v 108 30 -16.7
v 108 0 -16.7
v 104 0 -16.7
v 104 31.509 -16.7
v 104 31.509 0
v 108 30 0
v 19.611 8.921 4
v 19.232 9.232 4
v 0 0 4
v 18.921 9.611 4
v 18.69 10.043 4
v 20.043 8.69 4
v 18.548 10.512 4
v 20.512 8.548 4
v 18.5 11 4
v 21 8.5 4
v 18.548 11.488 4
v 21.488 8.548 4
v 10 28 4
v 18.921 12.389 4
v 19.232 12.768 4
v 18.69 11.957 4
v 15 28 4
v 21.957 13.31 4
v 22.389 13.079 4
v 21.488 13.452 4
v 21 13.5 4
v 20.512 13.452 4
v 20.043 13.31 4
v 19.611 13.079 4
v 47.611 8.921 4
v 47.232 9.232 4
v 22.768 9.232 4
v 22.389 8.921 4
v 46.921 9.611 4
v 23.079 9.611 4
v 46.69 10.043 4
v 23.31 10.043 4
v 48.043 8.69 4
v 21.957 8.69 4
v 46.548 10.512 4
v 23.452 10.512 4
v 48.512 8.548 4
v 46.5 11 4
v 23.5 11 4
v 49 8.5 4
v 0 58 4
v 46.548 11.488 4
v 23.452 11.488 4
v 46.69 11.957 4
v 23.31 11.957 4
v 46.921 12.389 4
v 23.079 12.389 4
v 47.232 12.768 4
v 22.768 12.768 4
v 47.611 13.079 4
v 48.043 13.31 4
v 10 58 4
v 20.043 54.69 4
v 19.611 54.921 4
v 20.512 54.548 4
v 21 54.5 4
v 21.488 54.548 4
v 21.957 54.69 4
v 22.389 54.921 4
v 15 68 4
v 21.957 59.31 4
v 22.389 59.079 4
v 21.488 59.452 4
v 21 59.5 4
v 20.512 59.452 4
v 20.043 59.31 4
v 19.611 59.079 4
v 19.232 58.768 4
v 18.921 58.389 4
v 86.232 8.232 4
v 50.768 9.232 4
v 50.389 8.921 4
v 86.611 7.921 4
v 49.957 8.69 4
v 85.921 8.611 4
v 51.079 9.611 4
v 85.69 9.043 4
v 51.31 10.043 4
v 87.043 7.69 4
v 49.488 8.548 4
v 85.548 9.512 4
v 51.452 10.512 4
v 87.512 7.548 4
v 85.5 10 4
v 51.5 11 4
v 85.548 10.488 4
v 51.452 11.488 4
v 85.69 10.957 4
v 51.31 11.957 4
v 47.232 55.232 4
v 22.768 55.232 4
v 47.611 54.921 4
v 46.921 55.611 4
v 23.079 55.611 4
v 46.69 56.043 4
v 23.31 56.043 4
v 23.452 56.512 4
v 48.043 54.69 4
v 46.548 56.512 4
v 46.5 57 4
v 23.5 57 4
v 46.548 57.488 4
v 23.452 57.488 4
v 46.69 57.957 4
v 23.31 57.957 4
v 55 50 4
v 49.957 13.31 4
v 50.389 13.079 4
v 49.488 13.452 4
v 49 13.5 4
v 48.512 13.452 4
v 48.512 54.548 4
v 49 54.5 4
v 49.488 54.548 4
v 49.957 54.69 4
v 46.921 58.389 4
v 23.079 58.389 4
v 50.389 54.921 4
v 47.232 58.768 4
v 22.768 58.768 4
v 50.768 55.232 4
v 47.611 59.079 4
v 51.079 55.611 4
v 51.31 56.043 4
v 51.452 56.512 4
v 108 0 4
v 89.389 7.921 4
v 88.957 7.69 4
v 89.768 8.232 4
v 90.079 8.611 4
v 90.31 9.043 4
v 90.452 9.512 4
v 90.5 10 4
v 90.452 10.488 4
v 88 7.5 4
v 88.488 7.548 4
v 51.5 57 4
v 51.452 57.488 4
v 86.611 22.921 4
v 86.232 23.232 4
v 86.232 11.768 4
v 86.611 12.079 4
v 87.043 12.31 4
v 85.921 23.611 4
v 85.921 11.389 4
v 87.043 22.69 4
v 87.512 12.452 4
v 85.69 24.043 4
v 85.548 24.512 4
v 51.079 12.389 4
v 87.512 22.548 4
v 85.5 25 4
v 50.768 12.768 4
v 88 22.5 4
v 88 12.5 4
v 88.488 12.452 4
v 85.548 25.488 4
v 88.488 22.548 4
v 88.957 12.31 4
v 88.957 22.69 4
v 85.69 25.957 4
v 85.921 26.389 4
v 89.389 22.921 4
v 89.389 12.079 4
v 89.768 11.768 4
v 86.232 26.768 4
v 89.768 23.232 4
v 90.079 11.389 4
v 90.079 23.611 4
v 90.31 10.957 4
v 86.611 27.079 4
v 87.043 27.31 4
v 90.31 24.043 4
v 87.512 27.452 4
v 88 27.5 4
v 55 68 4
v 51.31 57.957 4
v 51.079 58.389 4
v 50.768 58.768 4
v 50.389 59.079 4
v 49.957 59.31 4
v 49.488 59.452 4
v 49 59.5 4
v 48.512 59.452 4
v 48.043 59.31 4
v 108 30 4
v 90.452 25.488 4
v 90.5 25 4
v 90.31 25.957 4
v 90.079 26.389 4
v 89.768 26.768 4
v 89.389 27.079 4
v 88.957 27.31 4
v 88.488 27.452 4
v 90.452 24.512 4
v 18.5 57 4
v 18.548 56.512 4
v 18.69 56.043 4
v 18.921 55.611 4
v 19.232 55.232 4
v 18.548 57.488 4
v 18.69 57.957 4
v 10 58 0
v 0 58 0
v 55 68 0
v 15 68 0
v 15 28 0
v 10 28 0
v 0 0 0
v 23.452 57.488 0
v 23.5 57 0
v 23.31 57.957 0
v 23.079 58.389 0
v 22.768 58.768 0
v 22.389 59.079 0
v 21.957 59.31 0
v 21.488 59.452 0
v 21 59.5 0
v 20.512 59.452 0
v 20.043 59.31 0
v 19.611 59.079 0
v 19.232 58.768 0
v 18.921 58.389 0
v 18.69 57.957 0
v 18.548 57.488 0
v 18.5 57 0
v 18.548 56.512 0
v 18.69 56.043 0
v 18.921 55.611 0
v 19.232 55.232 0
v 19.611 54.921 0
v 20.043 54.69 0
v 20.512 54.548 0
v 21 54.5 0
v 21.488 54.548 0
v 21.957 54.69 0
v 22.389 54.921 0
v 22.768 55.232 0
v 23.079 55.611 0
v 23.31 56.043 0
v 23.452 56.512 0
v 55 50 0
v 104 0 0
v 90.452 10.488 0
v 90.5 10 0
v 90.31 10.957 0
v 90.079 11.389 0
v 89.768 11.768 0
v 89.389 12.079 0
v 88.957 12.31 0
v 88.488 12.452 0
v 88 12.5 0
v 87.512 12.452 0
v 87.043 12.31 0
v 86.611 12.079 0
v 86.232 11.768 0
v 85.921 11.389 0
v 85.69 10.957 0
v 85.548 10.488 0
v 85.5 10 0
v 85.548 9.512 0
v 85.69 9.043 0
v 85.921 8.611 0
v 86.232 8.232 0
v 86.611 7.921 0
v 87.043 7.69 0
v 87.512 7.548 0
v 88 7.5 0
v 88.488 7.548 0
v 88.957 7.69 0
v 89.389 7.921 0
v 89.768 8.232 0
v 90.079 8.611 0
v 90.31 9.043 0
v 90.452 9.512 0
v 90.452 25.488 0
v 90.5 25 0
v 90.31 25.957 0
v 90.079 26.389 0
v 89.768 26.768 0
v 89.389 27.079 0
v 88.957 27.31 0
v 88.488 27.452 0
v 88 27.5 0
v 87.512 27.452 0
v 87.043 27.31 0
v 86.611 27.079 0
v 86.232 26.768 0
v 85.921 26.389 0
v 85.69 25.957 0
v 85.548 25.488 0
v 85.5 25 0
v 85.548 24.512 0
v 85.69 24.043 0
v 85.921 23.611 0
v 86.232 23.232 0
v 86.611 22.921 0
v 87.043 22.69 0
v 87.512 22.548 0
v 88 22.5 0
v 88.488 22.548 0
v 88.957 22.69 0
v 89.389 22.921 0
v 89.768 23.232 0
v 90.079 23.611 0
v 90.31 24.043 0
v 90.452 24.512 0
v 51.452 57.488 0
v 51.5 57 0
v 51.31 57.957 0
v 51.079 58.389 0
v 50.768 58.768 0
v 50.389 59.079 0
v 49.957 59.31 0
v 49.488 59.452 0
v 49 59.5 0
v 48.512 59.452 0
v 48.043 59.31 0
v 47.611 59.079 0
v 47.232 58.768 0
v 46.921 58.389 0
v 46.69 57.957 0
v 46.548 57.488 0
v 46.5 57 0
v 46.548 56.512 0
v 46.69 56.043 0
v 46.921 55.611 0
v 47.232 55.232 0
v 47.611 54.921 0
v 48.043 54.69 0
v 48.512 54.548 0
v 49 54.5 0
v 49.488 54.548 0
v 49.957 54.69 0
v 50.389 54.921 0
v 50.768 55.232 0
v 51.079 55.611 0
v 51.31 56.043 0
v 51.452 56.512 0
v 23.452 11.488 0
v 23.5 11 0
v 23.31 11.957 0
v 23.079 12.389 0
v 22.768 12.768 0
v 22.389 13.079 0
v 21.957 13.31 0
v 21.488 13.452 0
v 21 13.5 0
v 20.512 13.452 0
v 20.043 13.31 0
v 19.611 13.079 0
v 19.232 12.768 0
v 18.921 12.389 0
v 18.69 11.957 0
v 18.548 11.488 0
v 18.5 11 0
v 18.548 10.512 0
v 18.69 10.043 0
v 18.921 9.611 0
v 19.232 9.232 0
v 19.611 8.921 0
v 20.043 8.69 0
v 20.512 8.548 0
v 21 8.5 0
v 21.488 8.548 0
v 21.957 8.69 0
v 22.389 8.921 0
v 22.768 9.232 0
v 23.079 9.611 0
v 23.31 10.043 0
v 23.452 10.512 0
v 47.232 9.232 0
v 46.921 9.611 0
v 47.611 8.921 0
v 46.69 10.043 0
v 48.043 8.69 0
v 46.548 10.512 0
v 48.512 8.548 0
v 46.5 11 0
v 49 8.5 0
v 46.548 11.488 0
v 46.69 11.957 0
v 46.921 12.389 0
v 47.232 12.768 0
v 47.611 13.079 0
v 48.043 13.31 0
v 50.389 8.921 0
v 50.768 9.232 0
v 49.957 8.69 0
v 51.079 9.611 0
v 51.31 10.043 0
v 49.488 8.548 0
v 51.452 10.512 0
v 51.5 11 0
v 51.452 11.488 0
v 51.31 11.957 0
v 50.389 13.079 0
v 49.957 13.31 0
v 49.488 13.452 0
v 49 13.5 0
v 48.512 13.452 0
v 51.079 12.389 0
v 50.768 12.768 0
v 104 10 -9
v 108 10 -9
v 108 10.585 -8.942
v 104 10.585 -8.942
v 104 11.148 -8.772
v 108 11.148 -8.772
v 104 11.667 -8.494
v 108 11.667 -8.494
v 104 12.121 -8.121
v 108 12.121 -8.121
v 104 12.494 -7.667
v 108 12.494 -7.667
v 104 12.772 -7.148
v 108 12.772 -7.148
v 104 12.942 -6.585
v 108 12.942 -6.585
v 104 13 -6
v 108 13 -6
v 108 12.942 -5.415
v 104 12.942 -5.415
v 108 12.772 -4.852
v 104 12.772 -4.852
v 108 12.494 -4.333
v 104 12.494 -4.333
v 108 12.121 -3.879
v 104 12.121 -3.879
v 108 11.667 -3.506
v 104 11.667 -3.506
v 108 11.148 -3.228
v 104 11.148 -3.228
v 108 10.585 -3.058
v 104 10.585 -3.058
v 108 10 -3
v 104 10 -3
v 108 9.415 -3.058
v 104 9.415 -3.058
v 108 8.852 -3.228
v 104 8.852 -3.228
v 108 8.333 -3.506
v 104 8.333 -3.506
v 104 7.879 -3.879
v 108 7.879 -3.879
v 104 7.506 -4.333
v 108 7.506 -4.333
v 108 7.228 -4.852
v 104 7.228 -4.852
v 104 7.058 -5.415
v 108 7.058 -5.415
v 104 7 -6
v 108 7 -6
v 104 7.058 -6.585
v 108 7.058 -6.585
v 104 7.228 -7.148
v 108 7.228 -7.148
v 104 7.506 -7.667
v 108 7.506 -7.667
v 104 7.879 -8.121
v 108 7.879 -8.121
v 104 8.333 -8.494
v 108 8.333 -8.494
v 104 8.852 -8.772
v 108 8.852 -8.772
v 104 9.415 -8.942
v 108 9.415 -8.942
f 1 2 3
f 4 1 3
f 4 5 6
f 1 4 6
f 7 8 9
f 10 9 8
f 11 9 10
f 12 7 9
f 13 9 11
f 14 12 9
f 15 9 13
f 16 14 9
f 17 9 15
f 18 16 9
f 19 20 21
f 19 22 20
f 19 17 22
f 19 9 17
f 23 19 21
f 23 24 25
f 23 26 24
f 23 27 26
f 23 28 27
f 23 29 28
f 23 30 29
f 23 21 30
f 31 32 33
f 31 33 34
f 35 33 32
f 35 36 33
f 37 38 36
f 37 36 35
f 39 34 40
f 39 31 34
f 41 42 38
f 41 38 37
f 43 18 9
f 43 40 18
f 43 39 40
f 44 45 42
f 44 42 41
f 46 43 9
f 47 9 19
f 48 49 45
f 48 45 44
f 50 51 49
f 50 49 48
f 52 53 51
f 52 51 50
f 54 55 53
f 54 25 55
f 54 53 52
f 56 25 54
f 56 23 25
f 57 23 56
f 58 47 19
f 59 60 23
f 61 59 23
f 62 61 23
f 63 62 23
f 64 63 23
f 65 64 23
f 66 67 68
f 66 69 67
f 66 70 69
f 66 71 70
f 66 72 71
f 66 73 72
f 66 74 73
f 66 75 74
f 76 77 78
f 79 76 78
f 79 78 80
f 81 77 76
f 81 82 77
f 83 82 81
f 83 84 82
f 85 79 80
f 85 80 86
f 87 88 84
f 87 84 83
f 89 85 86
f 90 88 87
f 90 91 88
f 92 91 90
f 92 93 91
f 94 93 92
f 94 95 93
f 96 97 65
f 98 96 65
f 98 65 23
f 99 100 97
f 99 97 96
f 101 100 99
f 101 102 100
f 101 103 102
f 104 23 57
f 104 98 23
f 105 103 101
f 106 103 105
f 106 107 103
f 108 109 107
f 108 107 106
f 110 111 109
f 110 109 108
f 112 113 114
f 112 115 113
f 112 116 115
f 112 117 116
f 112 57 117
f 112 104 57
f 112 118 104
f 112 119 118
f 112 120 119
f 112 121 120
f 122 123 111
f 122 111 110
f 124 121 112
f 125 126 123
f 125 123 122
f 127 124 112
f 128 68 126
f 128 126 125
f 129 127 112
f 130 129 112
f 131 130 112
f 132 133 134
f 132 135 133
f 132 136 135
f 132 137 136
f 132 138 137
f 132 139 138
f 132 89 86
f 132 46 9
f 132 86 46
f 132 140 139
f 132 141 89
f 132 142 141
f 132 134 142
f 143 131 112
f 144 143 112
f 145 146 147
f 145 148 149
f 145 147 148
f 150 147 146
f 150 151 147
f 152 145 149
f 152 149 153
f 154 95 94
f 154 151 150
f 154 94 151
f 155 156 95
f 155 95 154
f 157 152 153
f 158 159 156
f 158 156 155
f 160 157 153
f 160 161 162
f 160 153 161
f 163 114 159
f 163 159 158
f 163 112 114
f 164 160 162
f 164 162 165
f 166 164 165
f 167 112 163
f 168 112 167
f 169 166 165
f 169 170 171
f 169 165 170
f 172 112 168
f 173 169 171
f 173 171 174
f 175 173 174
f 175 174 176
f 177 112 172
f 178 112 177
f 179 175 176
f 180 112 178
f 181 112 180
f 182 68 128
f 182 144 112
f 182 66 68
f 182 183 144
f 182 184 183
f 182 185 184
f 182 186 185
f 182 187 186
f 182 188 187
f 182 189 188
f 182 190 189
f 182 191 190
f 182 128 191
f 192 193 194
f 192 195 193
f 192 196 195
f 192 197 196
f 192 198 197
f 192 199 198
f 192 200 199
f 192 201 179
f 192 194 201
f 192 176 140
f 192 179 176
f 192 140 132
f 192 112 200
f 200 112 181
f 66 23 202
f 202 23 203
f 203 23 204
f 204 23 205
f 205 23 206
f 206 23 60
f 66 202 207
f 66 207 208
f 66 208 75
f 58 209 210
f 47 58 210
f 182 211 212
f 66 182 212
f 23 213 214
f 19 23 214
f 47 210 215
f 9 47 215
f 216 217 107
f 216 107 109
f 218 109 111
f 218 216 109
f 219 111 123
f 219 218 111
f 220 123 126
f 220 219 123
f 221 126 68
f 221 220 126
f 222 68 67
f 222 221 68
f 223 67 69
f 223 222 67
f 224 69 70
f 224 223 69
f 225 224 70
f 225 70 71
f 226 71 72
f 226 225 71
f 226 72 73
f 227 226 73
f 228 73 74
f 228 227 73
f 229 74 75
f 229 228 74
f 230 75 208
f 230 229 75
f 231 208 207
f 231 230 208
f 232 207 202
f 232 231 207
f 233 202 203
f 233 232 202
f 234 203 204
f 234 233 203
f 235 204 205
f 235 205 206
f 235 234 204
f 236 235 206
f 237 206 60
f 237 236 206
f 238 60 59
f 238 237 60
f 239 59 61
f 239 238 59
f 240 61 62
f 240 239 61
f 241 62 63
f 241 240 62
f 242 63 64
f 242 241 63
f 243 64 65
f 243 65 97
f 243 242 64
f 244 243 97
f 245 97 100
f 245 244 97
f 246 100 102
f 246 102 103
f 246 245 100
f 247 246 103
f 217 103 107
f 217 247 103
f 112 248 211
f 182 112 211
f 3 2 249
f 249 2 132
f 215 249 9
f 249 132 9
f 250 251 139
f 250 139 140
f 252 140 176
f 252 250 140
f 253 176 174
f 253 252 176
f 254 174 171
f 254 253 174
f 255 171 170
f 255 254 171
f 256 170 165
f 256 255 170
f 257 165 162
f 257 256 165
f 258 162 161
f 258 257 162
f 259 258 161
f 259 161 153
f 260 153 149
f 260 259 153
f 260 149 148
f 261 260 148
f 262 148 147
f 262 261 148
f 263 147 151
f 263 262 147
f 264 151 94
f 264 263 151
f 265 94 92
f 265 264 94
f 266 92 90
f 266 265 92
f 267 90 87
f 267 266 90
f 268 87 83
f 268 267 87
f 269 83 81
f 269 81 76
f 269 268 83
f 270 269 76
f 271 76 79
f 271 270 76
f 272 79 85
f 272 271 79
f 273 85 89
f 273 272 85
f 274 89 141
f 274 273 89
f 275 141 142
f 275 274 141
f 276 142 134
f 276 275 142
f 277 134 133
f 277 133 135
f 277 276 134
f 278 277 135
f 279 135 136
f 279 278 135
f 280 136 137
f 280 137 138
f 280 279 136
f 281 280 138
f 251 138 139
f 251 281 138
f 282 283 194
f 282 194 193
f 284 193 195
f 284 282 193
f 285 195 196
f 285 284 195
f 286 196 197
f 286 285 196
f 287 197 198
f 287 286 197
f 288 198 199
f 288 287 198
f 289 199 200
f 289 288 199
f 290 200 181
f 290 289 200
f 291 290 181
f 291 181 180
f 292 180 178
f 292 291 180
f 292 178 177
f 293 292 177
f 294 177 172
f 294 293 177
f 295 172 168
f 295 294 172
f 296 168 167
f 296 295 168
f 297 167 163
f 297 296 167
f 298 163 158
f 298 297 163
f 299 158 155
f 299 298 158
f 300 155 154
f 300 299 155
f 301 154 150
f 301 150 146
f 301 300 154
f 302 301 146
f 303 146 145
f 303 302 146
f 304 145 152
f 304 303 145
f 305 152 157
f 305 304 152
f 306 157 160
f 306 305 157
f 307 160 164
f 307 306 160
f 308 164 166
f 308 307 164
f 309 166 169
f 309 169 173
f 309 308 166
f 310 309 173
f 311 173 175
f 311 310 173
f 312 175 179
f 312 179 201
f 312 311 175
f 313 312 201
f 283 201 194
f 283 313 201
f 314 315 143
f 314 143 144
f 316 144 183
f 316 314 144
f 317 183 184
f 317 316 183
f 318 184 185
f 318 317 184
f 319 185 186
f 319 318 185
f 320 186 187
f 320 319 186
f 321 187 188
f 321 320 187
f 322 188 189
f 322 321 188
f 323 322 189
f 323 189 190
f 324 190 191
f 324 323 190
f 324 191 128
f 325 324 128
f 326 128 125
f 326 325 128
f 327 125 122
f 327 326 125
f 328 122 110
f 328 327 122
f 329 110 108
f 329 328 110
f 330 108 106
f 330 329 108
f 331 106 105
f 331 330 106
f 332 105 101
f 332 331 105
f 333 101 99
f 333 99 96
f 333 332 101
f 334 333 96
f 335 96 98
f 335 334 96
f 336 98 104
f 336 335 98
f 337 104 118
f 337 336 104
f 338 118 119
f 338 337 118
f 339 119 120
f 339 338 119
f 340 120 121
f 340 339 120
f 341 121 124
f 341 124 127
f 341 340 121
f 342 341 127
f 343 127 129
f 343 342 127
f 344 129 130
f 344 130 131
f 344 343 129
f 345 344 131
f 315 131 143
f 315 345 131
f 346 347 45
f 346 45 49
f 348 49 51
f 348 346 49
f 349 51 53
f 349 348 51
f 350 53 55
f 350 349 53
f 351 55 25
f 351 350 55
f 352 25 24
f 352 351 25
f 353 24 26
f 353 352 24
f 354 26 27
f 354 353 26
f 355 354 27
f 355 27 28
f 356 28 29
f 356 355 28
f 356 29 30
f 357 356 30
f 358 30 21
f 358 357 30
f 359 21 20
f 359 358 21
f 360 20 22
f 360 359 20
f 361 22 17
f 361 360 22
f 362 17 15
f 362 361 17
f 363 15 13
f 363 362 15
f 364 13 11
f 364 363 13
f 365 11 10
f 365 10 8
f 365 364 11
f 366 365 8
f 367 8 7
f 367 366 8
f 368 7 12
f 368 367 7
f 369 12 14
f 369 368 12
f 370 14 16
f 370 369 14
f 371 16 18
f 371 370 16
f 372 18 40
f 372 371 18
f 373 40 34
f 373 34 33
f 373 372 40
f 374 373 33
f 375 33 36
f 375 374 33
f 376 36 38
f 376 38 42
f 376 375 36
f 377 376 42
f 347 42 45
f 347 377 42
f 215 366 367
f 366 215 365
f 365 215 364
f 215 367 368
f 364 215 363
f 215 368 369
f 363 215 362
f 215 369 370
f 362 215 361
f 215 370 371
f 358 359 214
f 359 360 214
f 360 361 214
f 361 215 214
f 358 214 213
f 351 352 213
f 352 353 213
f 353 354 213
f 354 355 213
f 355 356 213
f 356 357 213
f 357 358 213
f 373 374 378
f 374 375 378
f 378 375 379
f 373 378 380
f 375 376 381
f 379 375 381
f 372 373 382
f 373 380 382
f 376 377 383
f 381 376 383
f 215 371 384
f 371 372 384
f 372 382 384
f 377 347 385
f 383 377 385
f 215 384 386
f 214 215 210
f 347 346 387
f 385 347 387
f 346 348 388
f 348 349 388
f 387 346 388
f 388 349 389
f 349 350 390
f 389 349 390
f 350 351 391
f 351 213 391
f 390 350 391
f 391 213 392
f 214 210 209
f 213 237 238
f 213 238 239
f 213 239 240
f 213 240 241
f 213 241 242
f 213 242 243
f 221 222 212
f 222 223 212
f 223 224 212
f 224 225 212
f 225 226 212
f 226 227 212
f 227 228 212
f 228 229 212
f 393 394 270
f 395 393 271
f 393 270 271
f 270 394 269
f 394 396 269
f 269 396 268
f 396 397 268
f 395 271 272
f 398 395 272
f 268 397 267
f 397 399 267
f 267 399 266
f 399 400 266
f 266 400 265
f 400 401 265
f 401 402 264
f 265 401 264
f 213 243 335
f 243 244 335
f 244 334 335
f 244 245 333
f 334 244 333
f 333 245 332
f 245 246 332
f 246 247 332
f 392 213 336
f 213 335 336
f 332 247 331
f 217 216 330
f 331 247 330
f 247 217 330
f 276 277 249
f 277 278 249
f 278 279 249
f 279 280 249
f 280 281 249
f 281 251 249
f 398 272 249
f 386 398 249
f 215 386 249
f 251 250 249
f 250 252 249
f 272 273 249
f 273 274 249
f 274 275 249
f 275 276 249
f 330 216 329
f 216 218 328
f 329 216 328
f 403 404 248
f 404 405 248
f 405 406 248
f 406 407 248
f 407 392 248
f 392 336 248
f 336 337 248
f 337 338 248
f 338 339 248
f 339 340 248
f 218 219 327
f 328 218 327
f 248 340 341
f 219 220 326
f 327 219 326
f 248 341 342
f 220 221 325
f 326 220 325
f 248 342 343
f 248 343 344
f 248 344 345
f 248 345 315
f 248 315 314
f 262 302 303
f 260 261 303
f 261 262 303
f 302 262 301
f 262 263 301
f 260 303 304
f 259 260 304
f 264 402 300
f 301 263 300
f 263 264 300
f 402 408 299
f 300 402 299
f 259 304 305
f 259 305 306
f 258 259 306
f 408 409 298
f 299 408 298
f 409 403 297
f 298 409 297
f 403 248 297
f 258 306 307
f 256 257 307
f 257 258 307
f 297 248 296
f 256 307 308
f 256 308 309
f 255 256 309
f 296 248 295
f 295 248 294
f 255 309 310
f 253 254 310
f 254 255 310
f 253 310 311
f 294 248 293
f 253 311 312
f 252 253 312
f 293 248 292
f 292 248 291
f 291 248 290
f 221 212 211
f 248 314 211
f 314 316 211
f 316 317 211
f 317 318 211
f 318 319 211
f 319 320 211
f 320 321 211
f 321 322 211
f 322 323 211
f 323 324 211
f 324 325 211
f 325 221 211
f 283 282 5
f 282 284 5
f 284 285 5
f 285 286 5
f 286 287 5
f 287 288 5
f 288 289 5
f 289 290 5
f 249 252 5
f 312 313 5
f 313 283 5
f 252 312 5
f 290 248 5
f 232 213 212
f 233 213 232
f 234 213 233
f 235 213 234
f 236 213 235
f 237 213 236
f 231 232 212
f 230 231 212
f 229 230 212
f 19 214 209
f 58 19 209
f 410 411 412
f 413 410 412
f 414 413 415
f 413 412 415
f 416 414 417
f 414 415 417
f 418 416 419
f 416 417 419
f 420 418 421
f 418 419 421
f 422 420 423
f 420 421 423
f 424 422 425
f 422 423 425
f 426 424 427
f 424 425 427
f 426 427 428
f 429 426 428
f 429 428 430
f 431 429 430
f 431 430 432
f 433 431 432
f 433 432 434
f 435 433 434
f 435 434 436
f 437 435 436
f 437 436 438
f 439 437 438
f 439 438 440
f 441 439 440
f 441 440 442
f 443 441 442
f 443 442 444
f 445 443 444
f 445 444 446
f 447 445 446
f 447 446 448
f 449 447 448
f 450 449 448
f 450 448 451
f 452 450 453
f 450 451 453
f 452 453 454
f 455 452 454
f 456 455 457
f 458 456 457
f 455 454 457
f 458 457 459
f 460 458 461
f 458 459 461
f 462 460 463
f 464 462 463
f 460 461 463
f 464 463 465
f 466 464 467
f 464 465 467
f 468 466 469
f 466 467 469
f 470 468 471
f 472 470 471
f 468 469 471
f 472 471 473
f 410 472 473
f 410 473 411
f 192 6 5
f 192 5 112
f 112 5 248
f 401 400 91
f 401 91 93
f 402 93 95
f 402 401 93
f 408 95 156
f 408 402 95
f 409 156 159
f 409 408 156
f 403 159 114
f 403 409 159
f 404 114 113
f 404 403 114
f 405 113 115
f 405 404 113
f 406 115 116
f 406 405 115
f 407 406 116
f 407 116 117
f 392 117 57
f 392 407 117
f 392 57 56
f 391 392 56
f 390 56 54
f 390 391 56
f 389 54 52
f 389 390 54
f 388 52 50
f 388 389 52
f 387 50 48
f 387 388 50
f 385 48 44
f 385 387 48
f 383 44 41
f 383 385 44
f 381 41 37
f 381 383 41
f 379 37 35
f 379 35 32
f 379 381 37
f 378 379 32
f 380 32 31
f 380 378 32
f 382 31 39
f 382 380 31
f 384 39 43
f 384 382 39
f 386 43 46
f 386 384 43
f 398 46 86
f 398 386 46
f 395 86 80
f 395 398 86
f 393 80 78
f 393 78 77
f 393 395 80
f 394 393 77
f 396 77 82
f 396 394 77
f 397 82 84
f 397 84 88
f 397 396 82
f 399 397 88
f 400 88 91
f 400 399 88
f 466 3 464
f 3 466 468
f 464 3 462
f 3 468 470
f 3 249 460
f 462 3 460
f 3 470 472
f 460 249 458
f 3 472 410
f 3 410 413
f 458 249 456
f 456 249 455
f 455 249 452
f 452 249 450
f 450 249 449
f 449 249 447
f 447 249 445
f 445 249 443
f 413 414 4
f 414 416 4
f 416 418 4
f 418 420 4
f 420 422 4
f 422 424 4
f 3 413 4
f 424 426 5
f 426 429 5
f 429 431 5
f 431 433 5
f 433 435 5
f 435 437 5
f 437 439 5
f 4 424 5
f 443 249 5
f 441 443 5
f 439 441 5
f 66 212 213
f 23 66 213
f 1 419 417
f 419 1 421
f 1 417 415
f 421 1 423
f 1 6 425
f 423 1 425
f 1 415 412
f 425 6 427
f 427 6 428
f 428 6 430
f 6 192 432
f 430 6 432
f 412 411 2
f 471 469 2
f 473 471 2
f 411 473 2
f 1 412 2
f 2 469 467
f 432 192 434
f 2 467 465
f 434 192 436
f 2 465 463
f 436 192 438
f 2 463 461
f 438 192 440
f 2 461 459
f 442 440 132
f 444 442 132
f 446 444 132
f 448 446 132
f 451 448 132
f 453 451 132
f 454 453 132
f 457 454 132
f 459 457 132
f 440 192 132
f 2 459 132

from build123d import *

# Parameters (mm, degrees)
SKETCH_1_R          = 2.5
EXTRUDE_1_DEPTH     = 4
EXTRUDE_2_DEPTH     = 20.7
SKETCH_3_R          = 3
CUT_EXTRUDE_1_DEPTH = 6.7
CUT_EXTRUDE_2_DEPTH = 10


with BuildPart() as part:
    # Эскиз1 → Бобышка-Вытянуть1 (new body)
    with BuildSketch(Plane.XY):
        Polygon((0, 0), (108, 0), (108, 30), (55, 50), (55, 68), (0, 68), align=None)
        with Locations((21, 57)):
            Circle(SKETCH_1_R, mode=Mode.SUBTRACT)
        with Locations((49, 57)):
            Circle(SKETCH_1_R, mode=Mode.SUBTRACT)
        with Locations((21, 11)):
            Circle(SKETCH_1_R, mode=Mode.SUBTRACT)
        with Locations((49, 11)):
            Circle(SKETCH_1_R, mode=Mode.SUBTRACT)
        with Locations((88, 10)):
            Circle(SKETCH_1_R, mode=Mode.SUBTRACT)
        with Locations((88, 25)):
            Circle(SKETCH_1_R, mode=Mode.SUBTRACT)
    extrude(amount=EXTRUDE_1_DEPTH)

    # Эскиз2 → Бобышка-Вытянуть2 (add)
    with BuildSketch(Plane.XY.offset(4)):
        Polygon((108, 0), (104, 0), (104, 31.509433962), (108, 30), align=None)
    extrude(amount=-EXTRUDE_2_DEPTH)

    # Эскиз3 → Вырез-Вытянуть1 (cut)
    with BuildSketch(Plane(origin=(108, 0, 0), x_dir=(0, 0, -1), z_dir=(1, 0, 0))):
        with Locations((6, 10)):
            Circle(SKETCH_3_R)
    extrude(amount=-CUT_EXTRUDE_1_DEPTH, mode=Mode.SUBTRACT)

    # Эскиз4 → Вырез-Вытянуть2 (cut)
    with BuildSketch(Plane(origin=(0, 0, 0), x_dir=(-1, 0, 0), z_dir=(0, 0, -1))):
        Polygon((0, 68), (-15, 68), (-15, 48), (-15, 28), (-10, 28), (-10, 58), (0, 58), align=None)
    extrude(amount=-CUT_EXTRUDE_2_DEPTH, mode=Mode.SUBTRACT)


solid = part.part
